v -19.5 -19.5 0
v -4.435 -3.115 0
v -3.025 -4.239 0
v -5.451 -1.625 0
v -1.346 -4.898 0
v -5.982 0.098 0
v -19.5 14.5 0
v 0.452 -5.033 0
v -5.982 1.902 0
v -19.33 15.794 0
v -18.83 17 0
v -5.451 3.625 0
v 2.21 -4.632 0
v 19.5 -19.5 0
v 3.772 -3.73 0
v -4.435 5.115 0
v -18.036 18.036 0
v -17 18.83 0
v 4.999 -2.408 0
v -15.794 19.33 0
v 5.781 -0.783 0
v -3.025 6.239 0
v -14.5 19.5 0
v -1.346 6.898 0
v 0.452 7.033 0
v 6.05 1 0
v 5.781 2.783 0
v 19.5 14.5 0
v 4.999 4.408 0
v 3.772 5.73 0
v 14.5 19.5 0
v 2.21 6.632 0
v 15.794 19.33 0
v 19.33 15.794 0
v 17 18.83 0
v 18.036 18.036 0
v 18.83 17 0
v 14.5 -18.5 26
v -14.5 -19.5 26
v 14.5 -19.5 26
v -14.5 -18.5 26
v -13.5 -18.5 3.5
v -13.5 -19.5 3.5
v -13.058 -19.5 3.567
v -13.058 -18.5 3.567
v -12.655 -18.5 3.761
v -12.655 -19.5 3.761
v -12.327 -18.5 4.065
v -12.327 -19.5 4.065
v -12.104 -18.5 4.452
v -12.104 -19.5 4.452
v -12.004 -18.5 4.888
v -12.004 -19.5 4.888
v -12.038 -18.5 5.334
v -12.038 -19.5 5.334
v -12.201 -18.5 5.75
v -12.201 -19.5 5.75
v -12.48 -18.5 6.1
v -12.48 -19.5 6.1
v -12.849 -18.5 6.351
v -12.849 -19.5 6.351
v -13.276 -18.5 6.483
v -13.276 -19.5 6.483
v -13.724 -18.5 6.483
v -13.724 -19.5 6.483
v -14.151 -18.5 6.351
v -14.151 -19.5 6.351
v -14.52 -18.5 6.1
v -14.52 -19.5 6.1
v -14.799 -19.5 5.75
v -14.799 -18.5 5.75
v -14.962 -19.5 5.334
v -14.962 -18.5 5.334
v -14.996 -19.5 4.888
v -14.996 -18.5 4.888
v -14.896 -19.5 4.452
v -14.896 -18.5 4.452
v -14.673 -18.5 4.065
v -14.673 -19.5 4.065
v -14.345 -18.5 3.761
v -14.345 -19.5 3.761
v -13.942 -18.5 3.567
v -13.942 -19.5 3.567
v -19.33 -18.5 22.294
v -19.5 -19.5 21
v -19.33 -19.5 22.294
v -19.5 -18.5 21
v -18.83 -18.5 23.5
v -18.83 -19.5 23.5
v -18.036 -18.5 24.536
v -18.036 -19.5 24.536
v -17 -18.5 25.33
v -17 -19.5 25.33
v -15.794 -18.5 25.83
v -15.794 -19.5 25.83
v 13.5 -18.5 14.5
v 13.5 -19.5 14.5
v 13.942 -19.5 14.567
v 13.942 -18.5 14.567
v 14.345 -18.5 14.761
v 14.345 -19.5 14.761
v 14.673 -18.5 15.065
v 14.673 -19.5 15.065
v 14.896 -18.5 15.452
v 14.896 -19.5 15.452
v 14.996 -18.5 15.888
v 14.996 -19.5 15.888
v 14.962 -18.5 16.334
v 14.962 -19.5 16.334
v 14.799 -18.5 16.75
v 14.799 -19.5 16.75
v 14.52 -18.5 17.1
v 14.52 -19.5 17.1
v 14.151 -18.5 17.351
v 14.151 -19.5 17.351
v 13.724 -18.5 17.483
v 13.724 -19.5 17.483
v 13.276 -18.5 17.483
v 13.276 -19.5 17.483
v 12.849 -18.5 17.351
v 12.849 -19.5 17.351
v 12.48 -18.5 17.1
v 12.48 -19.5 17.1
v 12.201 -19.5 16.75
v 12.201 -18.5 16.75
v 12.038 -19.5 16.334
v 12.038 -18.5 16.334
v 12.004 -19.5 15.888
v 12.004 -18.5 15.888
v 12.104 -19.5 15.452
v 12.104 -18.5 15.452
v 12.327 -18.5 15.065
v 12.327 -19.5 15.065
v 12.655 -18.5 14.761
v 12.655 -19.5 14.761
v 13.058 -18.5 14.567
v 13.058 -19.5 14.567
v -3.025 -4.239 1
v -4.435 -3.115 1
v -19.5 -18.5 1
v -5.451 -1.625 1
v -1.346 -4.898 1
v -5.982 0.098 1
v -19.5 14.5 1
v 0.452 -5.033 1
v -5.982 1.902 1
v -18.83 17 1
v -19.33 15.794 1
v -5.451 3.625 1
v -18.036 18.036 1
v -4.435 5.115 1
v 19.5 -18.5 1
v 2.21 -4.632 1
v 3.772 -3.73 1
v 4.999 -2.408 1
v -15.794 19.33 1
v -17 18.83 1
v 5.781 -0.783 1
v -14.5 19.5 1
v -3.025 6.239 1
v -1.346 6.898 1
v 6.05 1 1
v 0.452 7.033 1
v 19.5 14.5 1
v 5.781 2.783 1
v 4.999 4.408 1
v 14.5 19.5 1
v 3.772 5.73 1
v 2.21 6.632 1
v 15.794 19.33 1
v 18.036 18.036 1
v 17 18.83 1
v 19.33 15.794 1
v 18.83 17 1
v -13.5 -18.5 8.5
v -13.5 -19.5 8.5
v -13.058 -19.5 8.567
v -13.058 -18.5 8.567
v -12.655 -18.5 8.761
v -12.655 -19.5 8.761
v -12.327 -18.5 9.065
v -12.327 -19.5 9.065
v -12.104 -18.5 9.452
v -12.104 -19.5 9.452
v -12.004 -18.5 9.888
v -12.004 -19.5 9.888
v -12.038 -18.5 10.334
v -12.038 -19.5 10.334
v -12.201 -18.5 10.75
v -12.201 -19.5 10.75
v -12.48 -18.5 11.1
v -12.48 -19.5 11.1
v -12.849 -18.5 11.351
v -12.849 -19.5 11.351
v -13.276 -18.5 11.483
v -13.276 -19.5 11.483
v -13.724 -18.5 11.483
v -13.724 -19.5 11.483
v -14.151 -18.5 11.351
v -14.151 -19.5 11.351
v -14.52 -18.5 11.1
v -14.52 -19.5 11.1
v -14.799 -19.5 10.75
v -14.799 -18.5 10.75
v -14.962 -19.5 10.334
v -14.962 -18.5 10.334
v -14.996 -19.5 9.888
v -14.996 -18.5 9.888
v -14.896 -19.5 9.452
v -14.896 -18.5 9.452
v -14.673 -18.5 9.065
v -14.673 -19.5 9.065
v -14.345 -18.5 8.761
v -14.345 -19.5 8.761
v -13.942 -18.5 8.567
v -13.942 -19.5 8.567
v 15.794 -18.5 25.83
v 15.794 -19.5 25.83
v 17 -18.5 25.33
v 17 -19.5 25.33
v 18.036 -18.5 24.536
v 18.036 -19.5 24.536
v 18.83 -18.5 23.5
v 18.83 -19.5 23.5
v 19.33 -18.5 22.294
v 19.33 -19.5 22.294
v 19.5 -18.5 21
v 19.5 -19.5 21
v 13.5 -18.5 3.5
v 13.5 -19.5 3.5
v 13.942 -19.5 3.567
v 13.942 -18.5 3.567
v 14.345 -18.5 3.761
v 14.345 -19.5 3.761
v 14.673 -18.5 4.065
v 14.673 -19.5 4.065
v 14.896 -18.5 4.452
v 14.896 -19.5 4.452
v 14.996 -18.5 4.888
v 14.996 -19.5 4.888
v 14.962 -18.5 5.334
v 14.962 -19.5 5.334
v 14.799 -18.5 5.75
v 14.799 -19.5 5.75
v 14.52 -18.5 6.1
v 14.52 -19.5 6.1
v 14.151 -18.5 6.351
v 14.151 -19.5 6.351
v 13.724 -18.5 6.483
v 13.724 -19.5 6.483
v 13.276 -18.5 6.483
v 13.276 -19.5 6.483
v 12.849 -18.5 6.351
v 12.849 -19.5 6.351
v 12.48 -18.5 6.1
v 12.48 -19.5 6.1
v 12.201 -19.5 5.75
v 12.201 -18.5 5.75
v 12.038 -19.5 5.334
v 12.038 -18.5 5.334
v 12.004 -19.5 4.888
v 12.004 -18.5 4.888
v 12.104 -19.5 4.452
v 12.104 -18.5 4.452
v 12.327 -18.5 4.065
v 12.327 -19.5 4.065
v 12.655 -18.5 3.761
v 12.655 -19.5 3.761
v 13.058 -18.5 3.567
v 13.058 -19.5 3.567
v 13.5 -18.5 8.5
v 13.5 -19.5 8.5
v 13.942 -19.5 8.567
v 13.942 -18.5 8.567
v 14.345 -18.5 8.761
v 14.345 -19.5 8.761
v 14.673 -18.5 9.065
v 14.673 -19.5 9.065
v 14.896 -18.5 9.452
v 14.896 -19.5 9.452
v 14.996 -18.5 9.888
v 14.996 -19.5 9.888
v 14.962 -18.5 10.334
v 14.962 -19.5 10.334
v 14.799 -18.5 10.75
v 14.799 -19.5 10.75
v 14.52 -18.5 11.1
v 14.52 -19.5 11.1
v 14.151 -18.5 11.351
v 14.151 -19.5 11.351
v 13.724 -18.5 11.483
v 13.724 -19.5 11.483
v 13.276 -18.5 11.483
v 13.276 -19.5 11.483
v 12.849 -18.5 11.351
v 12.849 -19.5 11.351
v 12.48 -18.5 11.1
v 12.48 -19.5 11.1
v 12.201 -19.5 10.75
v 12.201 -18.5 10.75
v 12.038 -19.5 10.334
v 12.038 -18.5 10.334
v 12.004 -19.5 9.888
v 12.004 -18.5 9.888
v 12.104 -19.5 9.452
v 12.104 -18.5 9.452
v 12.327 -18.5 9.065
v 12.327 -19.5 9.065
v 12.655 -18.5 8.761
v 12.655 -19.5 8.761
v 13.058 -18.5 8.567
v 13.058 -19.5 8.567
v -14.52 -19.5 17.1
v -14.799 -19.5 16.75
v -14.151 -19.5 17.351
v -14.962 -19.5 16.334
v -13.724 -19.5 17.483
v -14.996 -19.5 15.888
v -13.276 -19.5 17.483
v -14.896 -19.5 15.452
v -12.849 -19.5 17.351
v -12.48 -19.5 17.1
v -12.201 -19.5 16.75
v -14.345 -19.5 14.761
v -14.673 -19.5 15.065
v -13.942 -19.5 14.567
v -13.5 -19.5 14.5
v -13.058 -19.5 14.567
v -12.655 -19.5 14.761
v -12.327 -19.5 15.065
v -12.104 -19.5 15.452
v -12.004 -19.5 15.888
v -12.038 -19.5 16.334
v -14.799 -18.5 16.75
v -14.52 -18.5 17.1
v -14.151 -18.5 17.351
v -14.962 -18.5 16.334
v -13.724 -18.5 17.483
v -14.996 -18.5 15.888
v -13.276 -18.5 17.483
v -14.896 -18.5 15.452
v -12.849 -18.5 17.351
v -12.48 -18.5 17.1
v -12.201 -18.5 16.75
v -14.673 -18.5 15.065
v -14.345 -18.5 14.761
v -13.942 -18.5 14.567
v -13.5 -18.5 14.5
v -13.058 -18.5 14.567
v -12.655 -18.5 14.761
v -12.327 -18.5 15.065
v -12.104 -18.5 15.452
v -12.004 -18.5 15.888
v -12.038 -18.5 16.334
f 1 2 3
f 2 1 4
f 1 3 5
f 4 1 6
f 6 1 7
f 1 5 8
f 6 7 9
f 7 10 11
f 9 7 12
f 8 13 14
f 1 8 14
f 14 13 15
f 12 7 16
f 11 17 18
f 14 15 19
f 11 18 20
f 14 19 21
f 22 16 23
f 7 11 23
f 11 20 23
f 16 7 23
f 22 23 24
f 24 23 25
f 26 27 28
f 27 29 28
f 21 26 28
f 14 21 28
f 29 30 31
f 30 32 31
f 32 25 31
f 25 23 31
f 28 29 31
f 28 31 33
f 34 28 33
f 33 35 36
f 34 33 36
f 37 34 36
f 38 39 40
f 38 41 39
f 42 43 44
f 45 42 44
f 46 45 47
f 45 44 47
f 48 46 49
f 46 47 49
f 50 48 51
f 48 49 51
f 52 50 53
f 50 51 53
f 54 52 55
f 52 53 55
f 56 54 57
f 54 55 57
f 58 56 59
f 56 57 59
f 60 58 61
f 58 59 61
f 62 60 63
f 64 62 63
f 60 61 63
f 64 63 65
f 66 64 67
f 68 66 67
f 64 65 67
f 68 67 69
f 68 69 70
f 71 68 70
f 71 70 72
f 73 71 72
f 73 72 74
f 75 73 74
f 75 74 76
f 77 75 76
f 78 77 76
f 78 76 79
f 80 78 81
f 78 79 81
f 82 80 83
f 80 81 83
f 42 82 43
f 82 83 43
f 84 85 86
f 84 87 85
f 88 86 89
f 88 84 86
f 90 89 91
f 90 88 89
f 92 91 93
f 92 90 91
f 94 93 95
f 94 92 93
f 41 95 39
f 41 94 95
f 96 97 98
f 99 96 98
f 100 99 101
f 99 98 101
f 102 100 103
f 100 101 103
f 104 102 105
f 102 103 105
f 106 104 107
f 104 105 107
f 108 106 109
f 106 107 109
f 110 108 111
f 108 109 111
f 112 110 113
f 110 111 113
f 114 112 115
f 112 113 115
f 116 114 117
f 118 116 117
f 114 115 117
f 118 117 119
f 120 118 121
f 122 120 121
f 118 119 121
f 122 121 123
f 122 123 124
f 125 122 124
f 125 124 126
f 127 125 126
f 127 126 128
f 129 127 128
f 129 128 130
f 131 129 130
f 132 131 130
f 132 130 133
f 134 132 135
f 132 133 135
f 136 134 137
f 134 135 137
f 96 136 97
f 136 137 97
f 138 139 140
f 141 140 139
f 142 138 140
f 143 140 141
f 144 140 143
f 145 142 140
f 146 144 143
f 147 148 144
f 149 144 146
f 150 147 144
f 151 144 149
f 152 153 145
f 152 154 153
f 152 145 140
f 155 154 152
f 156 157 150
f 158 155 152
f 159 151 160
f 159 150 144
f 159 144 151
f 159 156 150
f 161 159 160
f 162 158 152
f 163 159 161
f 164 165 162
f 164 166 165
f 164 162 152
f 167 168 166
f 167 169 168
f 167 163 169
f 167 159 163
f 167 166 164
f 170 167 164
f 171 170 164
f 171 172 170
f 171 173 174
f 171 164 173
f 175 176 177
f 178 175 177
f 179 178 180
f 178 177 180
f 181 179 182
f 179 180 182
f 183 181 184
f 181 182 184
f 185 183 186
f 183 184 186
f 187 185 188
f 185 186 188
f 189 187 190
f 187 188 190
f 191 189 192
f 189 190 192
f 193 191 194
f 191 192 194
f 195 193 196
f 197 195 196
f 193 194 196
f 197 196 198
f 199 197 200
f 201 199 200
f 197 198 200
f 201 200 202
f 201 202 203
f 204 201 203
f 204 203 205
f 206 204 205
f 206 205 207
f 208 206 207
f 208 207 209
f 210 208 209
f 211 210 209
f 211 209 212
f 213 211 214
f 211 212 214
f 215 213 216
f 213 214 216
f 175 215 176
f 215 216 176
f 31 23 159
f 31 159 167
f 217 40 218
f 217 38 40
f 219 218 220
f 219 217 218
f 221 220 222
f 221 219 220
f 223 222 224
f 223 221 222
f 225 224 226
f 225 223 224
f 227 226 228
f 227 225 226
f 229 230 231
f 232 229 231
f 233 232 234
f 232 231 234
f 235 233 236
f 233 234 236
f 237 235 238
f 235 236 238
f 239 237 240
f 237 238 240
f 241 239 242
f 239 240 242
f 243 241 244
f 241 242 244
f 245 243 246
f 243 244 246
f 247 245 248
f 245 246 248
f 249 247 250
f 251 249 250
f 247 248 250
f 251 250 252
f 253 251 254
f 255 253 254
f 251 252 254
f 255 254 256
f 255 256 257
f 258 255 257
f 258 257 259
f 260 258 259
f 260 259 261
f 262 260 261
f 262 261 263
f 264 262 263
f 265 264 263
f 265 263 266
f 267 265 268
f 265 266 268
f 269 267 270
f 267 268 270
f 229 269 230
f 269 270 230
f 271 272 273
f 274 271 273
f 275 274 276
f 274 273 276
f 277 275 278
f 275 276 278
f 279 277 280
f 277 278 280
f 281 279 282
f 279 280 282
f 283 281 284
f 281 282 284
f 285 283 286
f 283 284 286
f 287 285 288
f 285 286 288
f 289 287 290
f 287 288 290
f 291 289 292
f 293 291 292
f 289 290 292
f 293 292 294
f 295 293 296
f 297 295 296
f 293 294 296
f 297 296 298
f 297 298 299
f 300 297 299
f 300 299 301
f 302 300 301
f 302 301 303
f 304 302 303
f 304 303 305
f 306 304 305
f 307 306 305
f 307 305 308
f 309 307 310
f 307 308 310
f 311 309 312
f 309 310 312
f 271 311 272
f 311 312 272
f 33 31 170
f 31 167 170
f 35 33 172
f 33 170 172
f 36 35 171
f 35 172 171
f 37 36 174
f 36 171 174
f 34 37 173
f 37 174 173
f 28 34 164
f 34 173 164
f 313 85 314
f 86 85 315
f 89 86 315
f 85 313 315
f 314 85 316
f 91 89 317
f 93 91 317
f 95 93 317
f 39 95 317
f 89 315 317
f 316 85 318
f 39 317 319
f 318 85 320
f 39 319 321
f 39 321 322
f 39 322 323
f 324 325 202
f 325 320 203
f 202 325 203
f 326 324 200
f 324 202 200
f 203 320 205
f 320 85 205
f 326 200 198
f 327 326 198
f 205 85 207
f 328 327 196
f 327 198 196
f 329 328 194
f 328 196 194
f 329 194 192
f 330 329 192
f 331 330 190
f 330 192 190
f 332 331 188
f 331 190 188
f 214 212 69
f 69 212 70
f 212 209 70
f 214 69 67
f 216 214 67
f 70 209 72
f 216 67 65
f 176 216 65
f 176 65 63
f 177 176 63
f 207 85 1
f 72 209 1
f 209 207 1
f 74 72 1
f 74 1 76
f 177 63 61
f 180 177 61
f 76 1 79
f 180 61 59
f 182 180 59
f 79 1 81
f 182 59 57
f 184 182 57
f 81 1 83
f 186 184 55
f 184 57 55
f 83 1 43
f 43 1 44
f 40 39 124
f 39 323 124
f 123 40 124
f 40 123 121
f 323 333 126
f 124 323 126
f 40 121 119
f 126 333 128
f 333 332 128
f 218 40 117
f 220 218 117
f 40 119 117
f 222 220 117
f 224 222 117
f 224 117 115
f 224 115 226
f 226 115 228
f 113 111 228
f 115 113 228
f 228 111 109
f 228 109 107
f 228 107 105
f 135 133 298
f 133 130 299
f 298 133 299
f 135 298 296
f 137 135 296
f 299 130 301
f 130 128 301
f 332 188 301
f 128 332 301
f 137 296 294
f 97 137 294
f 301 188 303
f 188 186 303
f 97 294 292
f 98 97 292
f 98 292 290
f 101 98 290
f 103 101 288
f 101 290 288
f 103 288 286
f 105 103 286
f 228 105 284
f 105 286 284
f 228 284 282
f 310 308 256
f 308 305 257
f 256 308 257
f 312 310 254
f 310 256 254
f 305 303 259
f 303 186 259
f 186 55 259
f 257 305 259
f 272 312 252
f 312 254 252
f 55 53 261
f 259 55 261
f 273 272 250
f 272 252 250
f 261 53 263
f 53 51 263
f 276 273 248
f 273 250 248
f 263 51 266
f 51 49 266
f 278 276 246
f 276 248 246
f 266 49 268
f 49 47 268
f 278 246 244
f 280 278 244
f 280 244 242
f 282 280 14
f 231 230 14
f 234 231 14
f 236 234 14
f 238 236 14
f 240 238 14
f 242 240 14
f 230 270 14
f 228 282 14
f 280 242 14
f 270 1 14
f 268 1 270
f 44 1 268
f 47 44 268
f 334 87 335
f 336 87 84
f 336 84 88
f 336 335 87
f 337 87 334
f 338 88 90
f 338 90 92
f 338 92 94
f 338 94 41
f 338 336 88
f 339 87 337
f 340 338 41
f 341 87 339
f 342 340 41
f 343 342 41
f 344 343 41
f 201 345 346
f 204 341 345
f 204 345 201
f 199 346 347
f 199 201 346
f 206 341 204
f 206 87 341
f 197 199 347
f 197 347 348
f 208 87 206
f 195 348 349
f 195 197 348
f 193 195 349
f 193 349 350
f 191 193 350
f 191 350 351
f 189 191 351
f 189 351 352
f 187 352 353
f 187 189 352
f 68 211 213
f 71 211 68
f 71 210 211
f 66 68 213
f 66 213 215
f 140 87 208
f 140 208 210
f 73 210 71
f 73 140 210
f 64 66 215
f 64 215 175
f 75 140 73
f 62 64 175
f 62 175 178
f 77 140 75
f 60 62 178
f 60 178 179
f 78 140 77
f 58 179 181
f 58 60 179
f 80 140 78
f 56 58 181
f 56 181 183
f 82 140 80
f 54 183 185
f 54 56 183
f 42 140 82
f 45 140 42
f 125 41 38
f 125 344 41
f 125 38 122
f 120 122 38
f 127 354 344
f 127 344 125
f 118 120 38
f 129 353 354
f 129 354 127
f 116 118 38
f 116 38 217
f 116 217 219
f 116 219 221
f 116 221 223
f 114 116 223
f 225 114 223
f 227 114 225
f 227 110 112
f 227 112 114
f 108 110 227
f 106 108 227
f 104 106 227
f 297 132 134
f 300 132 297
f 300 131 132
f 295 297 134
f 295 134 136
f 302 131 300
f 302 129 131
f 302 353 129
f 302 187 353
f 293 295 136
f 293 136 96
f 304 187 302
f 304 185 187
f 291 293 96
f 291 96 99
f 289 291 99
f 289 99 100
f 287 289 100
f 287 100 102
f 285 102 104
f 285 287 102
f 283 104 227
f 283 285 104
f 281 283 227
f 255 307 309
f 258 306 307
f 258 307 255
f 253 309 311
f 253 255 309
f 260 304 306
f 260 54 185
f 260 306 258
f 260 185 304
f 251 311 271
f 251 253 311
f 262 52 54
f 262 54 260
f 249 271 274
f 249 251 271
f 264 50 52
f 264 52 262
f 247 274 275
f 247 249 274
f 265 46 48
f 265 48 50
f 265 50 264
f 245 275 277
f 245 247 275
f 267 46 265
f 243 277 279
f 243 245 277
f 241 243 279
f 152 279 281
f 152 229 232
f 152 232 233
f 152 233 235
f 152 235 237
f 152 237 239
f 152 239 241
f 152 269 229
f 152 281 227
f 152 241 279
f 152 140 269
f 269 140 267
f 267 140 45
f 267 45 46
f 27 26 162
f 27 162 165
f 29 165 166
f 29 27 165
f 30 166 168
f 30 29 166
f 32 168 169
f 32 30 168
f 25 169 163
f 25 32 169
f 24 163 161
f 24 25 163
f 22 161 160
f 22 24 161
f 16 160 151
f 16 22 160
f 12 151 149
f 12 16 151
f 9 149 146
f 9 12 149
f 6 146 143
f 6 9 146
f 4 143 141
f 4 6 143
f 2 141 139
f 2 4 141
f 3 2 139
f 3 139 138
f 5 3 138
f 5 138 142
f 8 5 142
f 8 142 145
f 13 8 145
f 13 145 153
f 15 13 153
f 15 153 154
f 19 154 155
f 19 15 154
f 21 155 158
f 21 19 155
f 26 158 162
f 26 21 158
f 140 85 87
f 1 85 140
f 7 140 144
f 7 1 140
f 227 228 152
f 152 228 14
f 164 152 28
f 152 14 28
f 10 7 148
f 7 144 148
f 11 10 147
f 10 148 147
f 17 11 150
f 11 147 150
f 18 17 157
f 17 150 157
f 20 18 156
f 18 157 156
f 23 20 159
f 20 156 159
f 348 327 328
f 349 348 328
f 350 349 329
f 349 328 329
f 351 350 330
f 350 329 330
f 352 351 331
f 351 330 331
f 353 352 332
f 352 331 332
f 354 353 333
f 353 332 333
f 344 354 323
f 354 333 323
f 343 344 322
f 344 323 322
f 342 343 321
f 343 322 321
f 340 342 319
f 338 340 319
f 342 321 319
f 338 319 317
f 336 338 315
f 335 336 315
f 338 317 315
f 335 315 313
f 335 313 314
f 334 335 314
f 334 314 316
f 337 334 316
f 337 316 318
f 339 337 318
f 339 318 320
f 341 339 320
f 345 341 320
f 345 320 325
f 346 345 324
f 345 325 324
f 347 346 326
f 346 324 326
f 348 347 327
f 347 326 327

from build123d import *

# Parameters (mm, degrees)
SKETCH1_W           = 39
SKETCH1_H           = 39
BOSS_EXTRUDE1_DEPTH = 1
SKETCH2_W           = 39
SKETCH2_H           = 1
BOSS_EXTRUDE2_DEPTH = 25
SKETCH5_R           = 1.5
CUT_EXTRUDE2_DEPTH  = 1
SKETCH6_R           = 1.5
CUT_EXTRUDE3_DEPTH  = 1
FILLET1_R           = 5
SKETCH7_R           = 6.05
CUT_EXTRUDE4_DEPTH  = 1


with BuildPart() as part:
    # Sketch1 → Boss-Extrude1 (new body)
    with BuildSketch(Plane.XY):
        Rectangle(SKETCH1_W, SKETCH1_H)
    extrude(amount=BOSS_EXTRUDE1_DEPTH)

    # Sketch2 → Boss-Extrude2 (add)
    with BuildSketch(Plane.XY.offset(1)):
        with Locations((0, -19)):
            Rectangle(SKETCH2_W, SKETCH2_H)
    extrude(amount=BOSS_EXTRUDE2_DEPTH)

    # Sketch5 → Cut-Extrude2 (cut)
    with BuildSketch(Plane.XZ.offset(19.5)):
        with Locations(Location((13.5, 5, 0), (0, 0, 270))):
            Circle(SKETCH5_R)
        with Locations(Location((13.5, 10, 0), (0, 0, 270))):
            Circle(SKETCH5_R)
        with Locations(Location((13.5, 16, 0), (0, 0, 270))):
            Circle(SKETCH5_R)
    extrude(amount=-CUT_EXTRUDE2_DEPTH, mode=Mode.SUBTRACT)

    # Sketch6 → Cut-Extrude3 (cut)
    with BuildSketch(Plane.XZ.offset(19.5)):
        with Locations(Location((-13.5, 16, 0), (0, 0, 270))):
            Circle(SKETCH6_R)
        with Locations(Location((-13.5, 10, 0), (0, 0, 270))):
            Circle(SKETCH6_R)
        with Locations(Location((-13.5, 5, 0), (0, 0, 270))):
            Circle(SKETCH6_R)
    extrude(amount=-CUT_EXTRUDE3_DEPTH, mode=Mode.SUBTRACT)

    # Fillet1
    fillet1_edges = [part.edges().sort_by_distance(p)[0] for p in [
        (-19.5, -19, 26),
        (19.5, -19, 26),
        (-19.5, 19.5, 0.5),
        (19.5, 19.5, 0.5),
    ]]
    fillet(fillet1_edges, radius=FILLET1_R)

    # Sketch7 → Cut-Extrude4 (cut)
    with BuildSketch(Plane.XY):
        with Locations((0, 1)):
            Circle(SKETCH7_R)
    extrude(amount=CUT_EXTRUDE4_DEPTH, mode=Mode.SUBTRACT)


solid = part.part
